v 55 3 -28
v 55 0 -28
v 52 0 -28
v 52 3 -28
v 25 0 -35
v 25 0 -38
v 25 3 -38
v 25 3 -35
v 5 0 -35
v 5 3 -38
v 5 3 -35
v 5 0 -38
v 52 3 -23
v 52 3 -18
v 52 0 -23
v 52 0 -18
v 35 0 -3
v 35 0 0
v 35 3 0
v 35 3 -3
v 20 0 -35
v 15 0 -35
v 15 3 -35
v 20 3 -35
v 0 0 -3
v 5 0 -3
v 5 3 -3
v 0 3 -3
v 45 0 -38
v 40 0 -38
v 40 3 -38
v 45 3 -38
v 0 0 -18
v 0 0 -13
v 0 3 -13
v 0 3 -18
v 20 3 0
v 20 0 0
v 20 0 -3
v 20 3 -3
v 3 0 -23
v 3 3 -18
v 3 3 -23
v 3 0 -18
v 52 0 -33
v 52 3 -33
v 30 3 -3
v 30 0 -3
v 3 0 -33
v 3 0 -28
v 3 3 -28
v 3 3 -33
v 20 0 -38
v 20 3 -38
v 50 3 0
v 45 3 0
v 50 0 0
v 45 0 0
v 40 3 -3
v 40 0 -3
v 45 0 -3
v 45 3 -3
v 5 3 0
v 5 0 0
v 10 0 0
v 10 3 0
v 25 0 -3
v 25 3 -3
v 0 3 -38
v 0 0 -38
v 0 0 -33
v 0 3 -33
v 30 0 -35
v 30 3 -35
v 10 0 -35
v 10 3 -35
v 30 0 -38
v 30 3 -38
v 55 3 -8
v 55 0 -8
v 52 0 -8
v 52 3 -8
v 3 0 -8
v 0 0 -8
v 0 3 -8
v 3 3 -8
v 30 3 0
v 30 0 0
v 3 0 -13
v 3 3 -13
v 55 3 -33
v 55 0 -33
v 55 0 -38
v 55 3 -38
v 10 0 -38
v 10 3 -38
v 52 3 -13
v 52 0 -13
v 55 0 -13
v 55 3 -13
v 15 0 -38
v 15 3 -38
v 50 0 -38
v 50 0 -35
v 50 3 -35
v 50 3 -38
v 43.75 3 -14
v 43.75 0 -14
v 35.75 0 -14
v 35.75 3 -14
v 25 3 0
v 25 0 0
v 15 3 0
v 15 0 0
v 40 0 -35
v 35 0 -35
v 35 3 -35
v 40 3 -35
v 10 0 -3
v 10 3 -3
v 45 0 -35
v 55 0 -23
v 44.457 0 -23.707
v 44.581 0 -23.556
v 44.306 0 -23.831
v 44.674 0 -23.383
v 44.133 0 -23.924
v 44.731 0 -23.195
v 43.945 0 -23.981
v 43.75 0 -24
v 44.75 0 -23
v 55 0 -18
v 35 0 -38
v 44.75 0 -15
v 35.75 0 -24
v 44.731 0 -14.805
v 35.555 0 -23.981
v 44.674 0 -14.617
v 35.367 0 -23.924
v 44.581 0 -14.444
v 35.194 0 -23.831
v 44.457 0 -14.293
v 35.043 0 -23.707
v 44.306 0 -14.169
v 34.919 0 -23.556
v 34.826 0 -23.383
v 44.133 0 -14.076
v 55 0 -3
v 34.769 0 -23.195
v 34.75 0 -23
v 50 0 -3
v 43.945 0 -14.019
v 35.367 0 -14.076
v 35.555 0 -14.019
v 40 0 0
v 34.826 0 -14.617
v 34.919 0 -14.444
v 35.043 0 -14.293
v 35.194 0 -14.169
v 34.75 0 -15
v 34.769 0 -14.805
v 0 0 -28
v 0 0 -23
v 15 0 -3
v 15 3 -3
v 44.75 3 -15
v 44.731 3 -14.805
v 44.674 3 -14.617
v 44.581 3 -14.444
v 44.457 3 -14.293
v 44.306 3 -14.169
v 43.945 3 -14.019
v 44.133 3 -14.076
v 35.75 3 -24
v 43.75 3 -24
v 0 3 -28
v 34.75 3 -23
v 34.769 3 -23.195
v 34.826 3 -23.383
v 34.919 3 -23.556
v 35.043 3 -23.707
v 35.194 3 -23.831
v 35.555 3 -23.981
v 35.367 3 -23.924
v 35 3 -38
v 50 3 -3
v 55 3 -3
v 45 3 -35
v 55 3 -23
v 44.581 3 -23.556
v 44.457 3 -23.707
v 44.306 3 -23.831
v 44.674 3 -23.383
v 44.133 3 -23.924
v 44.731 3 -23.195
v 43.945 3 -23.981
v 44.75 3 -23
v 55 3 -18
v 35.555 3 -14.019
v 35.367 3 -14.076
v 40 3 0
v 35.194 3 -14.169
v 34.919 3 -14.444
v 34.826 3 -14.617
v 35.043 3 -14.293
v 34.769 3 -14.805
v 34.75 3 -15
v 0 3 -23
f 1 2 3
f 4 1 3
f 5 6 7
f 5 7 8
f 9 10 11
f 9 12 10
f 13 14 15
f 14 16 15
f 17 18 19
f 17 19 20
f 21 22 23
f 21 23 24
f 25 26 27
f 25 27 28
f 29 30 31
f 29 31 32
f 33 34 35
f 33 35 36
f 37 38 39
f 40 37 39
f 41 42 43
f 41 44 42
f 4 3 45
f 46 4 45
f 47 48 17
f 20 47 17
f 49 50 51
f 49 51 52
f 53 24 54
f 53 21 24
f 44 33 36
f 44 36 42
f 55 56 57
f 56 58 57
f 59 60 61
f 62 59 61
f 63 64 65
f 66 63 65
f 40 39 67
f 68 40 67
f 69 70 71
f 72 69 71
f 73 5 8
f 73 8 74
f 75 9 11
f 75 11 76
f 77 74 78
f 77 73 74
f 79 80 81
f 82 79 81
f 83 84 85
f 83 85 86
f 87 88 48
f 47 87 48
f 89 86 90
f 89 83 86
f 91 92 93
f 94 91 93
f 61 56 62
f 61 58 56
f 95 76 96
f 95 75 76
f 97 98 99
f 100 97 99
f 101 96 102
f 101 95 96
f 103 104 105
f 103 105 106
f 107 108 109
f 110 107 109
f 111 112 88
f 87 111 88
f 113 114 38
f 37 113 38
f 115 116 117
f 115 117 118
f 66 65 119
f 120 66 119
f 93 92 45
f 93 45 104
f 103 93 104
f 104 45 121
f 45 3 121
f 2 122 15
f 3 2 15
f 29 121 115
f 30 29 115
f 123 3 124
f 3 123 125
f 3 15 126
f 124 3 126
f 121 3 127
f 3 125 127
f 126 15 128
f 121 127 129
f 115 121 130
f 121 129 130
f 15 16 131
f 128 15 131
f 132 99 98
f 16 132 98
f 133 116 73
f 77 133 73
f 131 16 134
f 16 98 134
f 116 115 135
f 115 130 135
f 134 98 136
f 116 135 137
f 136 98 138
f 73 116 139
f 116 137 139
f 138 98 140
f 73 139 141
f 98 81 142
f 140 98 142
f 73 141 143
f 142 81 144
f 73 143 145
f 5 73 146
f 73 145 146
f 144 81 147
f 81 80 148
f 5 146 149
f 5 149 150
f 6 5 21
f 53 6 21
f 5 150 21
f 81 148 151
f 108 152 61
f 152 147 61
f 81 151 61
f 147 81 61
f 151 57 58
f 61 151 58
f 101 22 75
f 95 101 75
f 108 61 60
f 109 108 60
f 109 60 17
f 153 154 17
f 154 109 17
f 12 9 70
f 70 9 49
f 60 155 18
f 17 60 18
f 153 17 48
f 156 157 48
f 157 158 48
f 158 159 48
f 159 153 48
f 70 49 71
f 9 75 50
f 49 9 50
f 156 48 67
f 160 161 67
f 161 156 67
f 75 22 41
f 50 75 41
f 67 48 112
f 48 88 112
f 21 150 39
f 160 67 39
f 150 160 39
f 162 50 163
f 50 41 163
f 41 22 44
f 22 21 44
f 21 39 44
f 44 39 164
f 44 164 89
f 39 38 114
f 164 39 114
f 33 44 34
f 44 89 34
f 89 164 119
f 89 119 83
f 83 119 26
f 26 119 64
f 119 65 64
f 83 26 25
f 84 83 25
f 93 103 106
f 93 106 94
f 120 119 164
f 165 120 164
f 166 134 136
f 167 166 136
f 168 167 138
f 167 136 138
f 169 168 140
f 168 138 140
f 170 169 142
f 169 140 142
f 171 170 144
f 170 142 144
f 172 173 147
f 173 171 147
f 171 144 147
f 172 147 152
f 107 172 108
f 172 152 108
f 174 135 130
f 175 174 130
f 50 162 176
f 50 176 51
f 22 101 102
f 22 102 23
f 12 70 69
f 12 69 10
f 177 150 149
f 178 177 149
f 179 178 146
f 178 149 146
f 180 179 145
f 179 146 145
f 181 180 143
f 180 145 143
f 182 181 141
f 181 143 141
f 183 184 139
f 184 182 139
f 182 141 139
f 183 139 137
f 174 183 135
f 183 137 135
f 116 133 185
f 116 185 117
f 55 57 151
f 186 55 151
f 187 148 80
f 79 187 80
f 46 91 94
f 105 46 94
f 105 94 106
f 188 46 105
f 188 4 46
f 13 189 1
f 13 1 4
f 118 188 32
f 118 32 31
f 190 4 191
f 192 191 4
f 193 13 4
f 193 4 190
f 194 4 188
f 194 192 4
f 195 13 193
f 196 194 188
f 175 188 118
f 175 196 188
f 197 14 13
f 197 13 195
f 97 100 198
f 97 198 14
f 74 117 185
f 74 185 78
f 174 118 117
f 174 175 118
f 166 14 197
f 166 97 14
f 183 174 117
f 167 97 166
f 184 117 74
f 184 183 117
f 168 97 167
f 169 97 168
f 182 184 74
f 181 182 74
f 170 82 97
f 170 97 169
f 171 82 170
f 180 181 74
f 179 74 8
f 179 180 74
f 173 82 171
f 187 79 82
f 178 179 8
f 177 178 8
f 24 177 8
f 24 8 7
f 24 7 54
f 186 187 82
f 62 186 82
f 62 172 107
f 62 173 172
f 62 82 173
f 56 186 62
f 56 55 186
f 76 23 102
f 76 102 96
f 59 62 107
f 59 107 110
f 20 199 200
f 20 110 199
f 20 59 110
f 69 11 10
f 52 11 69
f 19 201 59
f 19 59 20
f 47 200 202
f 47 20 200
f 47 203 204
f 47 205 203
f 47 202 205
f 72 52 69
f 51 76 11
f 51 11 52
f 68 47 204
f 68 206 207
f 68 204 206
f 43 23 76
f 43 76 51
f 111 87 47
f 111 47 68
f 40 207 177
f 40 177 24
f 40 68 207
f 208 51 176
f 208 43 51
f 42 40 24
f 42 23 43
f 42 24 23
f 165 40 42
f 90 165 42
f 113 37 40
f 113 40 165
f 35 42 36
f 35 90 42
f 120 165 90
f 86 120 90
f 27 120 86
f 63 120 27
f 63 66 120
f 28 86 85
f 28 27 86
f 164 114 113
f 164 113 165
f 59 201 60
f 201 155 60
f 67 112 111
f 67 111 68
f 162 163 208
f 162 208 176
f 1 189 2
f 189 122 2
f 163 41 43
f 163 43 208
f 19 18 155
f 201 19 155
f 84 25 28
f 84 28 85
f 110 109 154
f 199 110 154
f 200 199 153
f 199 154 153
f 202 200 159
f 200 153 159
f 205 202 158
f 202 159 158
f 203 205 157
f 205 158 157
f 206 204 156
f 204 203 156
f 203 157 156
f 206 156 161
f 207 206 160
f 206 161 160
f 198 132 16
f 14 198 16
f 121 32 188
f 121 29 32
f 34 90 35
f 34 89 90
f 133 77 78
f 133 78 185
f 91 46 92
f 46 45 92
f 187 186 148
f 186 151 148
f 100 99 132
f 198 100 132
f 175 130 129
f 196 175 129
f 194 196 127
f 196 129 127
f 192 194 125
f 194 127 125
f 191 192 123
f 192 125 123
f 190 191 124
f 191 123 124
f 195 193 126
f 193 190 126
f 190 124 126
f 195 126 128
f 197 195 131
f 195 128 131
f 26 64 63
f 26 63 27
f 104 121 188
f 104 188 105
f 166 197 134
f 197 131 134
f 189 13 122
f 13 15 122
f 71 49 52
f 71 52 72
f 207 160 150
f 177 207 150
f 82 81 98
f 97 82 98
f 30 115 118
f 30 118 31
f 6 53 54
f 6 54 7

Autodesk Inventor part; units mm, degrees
ref_plane "YZ Plane" through (0, 0, 0) normal (1, 0, 0) x (0, 1, 0)
ref_plane "XZ Plane" through (0, 0, 0) normal (0, 1, 0) x (-1, 0, 0)
ref_plane "XY Plane" through (0, 0, 0) normal (0, 0, 1) x (1, 0, 0)
sketch "Skizze1" plane through (0, 0, 0) normal (0, 1, 0) x (-1, 0, 0)
  line L0 (-5, 0) -> (-5, -3)
  line L1 (-5, -3) -> (0, -3)
  line L2 (-5, 0) -> (-10, 0)
  line L3 (-10, 0) -> (-10, -3)
  line L4 (-10, -3) -> (-15, -3)
  line L5 (-15, 0) -> (-15, -3)
  line L6 (-15, 0) -> (-20, 0)
  line L7 (-20, 0) -> (-20, -3)
  line L8 (-20, -3) -> (-25, -3)
  line L9 (-25, 0) -> (-25, -3)
  line L10 (-25, 0) -> (-30, 0)
  line L11 (-30, 0) -> (-30, -3)
  line L12 (-30, -3) -> (-35, -3)
  line L13 (-35, 0) -> (-35, -3)
  line L14 (-35, 0) -> (-40, 0)
  line L15 (-40, 0) -> (-40, -3)
  line L16 (-40, -3) -> (-45, -3)
  line L17 (-45, 0) -> (-45, -3)
  line L18 (-45, 0) -> (-50, 0)
  line L19 (-50, 0) -> (-50, -3)
  line L20 (-50, -3) -> (-55, -3)
  line L21 (-55, -3) -> (-55, -8)
  line L22 (-55, -8) -> (-52, -8)
  line L23 (-52, -8) -> (-52, -13)
  line L24 (-52, -13) -> (-55, -13)
  line L25 (0, -3) -> (0, -8)
  line L26 (0, -8) -> (-3, -8)
  line L27 (-3, -8) -> (-3, -13)
  line L28 (-3, -13) -> (0, -13)
  line L29 (-52, -18) -> (-52, -23)
  line L30 (-55, -13) -> (-55, -18)
  line L31 (-52, -23) -> (-55, -23)
  line L32 (-55, -18) -> (-52, -18)
  line L33 (-3, -18) -> (-3, -23)
  line L34 (-3, -23) -> (0, -23)
  line L35 (0, -18) -> (-3, -18)
  line L36 (0, -13) -> (0, -18)
  line L37 (0, -38) -> (-5, -38)
  line L38 (-5, -38) -> (-5, -35)
  line L39 (-5, -35) -> (-10, -35)
  line L40 (-10, -35) -> (-10, -38)
  line L41 (-15, -35) -> (-20, -35)
  line L42 (-20, -35) -> (-20, -38)
  line L43 (-10, -38) -> (-15, -38)
  line L44 (-15, -38) -> (-15, -35)
  line L45 (-25, -35) -> (-30, -35)
  line L46 (-30, -35) -> (-30, -38)
  line L47 (-20, -38) -> (-25, -38)
  line L48 (-25, -38) -> (-25, -35)
  line L49 (-35, -35) -> (-40, -35)
  line L50 (-40, -35) -> (-40, -38)
  line L51 (-30, -38) -> (-35, -38)
  line L52 (-35, -38) -> (-35, -35)
  line L53 (-45, -35) -> (-50, -35)
  line L54 (-50, -35) -> (-50, -38)
  line L55 (-40, -38) -> (-45, -38)
  line L56 (-45, -38) -> (-45, -35)
  line L57 (-50, -38) -> (-55, -38)
  line L58 (-35.75, -24) -> (-43.75, -24)
  line L59 (-44.75, -23) -> (-44.75, -15)
  line L60 (-43.75, -14) -> (-35.75, -14)
  line L61 (-34.75, -15) -> (-34.75, -23)
  arc A0 (-35.75, -24) -> (-34.75, -23) centre (-35.75, -23) ccw
  arc A1 (-44.75, -23) -> (-43.75, -24) centre (-43.75, -23) ccw
  arc A2 (-43.75, -14) -> (-44.75, -15) centre (-43.75, -15) ccw
  arc A3 (-34.75, -15) -> (-35.75, -14) centre (-35.75, -15) ccw
  line L62 (-27.5, -38) -> (-27.5, 0) construction
  line L63 (-27.5, -19) -> (-52, -19) construction
  line L64 (-52, -28) -> (-52, -33)
  line L65 (-55, -23) -> (-55, -28)
  line L66 (-52, -33) -> (-55, -33)
  line L67 (-55, -28) -> (-52, -28)
  line L68 (-3, -28) -> (-3, -33)
  line L69 (-3, -33) -> (0, -33)
  line L70 (0, -28) -> (-3, -28)
  line L71 (0, -23) -> (0, -28)
  line L72 (0, -38) -> (0, -33)
  line L73 (-55, -33) -> (-55, -38)
  point P0 (0, 0)
  point P1 (-34.75, -19)
  point P2 (-39.75, -19)
  point P3 (-39.75, -24)
  dimension "d2" = 5
  dimension "d3" = 3
  dimension "d6" = 10
  dimension "d22" = 10
  dimension "d29" = 10
  dimension "d34" = 1
  dimension "d36" = 10
  dimension "d37" = 10
extrude "Extrusion1" add sketch "Skizze1" along normal blind 3
properties part number "plate_front_small" material "Holz (Kirsche)"
